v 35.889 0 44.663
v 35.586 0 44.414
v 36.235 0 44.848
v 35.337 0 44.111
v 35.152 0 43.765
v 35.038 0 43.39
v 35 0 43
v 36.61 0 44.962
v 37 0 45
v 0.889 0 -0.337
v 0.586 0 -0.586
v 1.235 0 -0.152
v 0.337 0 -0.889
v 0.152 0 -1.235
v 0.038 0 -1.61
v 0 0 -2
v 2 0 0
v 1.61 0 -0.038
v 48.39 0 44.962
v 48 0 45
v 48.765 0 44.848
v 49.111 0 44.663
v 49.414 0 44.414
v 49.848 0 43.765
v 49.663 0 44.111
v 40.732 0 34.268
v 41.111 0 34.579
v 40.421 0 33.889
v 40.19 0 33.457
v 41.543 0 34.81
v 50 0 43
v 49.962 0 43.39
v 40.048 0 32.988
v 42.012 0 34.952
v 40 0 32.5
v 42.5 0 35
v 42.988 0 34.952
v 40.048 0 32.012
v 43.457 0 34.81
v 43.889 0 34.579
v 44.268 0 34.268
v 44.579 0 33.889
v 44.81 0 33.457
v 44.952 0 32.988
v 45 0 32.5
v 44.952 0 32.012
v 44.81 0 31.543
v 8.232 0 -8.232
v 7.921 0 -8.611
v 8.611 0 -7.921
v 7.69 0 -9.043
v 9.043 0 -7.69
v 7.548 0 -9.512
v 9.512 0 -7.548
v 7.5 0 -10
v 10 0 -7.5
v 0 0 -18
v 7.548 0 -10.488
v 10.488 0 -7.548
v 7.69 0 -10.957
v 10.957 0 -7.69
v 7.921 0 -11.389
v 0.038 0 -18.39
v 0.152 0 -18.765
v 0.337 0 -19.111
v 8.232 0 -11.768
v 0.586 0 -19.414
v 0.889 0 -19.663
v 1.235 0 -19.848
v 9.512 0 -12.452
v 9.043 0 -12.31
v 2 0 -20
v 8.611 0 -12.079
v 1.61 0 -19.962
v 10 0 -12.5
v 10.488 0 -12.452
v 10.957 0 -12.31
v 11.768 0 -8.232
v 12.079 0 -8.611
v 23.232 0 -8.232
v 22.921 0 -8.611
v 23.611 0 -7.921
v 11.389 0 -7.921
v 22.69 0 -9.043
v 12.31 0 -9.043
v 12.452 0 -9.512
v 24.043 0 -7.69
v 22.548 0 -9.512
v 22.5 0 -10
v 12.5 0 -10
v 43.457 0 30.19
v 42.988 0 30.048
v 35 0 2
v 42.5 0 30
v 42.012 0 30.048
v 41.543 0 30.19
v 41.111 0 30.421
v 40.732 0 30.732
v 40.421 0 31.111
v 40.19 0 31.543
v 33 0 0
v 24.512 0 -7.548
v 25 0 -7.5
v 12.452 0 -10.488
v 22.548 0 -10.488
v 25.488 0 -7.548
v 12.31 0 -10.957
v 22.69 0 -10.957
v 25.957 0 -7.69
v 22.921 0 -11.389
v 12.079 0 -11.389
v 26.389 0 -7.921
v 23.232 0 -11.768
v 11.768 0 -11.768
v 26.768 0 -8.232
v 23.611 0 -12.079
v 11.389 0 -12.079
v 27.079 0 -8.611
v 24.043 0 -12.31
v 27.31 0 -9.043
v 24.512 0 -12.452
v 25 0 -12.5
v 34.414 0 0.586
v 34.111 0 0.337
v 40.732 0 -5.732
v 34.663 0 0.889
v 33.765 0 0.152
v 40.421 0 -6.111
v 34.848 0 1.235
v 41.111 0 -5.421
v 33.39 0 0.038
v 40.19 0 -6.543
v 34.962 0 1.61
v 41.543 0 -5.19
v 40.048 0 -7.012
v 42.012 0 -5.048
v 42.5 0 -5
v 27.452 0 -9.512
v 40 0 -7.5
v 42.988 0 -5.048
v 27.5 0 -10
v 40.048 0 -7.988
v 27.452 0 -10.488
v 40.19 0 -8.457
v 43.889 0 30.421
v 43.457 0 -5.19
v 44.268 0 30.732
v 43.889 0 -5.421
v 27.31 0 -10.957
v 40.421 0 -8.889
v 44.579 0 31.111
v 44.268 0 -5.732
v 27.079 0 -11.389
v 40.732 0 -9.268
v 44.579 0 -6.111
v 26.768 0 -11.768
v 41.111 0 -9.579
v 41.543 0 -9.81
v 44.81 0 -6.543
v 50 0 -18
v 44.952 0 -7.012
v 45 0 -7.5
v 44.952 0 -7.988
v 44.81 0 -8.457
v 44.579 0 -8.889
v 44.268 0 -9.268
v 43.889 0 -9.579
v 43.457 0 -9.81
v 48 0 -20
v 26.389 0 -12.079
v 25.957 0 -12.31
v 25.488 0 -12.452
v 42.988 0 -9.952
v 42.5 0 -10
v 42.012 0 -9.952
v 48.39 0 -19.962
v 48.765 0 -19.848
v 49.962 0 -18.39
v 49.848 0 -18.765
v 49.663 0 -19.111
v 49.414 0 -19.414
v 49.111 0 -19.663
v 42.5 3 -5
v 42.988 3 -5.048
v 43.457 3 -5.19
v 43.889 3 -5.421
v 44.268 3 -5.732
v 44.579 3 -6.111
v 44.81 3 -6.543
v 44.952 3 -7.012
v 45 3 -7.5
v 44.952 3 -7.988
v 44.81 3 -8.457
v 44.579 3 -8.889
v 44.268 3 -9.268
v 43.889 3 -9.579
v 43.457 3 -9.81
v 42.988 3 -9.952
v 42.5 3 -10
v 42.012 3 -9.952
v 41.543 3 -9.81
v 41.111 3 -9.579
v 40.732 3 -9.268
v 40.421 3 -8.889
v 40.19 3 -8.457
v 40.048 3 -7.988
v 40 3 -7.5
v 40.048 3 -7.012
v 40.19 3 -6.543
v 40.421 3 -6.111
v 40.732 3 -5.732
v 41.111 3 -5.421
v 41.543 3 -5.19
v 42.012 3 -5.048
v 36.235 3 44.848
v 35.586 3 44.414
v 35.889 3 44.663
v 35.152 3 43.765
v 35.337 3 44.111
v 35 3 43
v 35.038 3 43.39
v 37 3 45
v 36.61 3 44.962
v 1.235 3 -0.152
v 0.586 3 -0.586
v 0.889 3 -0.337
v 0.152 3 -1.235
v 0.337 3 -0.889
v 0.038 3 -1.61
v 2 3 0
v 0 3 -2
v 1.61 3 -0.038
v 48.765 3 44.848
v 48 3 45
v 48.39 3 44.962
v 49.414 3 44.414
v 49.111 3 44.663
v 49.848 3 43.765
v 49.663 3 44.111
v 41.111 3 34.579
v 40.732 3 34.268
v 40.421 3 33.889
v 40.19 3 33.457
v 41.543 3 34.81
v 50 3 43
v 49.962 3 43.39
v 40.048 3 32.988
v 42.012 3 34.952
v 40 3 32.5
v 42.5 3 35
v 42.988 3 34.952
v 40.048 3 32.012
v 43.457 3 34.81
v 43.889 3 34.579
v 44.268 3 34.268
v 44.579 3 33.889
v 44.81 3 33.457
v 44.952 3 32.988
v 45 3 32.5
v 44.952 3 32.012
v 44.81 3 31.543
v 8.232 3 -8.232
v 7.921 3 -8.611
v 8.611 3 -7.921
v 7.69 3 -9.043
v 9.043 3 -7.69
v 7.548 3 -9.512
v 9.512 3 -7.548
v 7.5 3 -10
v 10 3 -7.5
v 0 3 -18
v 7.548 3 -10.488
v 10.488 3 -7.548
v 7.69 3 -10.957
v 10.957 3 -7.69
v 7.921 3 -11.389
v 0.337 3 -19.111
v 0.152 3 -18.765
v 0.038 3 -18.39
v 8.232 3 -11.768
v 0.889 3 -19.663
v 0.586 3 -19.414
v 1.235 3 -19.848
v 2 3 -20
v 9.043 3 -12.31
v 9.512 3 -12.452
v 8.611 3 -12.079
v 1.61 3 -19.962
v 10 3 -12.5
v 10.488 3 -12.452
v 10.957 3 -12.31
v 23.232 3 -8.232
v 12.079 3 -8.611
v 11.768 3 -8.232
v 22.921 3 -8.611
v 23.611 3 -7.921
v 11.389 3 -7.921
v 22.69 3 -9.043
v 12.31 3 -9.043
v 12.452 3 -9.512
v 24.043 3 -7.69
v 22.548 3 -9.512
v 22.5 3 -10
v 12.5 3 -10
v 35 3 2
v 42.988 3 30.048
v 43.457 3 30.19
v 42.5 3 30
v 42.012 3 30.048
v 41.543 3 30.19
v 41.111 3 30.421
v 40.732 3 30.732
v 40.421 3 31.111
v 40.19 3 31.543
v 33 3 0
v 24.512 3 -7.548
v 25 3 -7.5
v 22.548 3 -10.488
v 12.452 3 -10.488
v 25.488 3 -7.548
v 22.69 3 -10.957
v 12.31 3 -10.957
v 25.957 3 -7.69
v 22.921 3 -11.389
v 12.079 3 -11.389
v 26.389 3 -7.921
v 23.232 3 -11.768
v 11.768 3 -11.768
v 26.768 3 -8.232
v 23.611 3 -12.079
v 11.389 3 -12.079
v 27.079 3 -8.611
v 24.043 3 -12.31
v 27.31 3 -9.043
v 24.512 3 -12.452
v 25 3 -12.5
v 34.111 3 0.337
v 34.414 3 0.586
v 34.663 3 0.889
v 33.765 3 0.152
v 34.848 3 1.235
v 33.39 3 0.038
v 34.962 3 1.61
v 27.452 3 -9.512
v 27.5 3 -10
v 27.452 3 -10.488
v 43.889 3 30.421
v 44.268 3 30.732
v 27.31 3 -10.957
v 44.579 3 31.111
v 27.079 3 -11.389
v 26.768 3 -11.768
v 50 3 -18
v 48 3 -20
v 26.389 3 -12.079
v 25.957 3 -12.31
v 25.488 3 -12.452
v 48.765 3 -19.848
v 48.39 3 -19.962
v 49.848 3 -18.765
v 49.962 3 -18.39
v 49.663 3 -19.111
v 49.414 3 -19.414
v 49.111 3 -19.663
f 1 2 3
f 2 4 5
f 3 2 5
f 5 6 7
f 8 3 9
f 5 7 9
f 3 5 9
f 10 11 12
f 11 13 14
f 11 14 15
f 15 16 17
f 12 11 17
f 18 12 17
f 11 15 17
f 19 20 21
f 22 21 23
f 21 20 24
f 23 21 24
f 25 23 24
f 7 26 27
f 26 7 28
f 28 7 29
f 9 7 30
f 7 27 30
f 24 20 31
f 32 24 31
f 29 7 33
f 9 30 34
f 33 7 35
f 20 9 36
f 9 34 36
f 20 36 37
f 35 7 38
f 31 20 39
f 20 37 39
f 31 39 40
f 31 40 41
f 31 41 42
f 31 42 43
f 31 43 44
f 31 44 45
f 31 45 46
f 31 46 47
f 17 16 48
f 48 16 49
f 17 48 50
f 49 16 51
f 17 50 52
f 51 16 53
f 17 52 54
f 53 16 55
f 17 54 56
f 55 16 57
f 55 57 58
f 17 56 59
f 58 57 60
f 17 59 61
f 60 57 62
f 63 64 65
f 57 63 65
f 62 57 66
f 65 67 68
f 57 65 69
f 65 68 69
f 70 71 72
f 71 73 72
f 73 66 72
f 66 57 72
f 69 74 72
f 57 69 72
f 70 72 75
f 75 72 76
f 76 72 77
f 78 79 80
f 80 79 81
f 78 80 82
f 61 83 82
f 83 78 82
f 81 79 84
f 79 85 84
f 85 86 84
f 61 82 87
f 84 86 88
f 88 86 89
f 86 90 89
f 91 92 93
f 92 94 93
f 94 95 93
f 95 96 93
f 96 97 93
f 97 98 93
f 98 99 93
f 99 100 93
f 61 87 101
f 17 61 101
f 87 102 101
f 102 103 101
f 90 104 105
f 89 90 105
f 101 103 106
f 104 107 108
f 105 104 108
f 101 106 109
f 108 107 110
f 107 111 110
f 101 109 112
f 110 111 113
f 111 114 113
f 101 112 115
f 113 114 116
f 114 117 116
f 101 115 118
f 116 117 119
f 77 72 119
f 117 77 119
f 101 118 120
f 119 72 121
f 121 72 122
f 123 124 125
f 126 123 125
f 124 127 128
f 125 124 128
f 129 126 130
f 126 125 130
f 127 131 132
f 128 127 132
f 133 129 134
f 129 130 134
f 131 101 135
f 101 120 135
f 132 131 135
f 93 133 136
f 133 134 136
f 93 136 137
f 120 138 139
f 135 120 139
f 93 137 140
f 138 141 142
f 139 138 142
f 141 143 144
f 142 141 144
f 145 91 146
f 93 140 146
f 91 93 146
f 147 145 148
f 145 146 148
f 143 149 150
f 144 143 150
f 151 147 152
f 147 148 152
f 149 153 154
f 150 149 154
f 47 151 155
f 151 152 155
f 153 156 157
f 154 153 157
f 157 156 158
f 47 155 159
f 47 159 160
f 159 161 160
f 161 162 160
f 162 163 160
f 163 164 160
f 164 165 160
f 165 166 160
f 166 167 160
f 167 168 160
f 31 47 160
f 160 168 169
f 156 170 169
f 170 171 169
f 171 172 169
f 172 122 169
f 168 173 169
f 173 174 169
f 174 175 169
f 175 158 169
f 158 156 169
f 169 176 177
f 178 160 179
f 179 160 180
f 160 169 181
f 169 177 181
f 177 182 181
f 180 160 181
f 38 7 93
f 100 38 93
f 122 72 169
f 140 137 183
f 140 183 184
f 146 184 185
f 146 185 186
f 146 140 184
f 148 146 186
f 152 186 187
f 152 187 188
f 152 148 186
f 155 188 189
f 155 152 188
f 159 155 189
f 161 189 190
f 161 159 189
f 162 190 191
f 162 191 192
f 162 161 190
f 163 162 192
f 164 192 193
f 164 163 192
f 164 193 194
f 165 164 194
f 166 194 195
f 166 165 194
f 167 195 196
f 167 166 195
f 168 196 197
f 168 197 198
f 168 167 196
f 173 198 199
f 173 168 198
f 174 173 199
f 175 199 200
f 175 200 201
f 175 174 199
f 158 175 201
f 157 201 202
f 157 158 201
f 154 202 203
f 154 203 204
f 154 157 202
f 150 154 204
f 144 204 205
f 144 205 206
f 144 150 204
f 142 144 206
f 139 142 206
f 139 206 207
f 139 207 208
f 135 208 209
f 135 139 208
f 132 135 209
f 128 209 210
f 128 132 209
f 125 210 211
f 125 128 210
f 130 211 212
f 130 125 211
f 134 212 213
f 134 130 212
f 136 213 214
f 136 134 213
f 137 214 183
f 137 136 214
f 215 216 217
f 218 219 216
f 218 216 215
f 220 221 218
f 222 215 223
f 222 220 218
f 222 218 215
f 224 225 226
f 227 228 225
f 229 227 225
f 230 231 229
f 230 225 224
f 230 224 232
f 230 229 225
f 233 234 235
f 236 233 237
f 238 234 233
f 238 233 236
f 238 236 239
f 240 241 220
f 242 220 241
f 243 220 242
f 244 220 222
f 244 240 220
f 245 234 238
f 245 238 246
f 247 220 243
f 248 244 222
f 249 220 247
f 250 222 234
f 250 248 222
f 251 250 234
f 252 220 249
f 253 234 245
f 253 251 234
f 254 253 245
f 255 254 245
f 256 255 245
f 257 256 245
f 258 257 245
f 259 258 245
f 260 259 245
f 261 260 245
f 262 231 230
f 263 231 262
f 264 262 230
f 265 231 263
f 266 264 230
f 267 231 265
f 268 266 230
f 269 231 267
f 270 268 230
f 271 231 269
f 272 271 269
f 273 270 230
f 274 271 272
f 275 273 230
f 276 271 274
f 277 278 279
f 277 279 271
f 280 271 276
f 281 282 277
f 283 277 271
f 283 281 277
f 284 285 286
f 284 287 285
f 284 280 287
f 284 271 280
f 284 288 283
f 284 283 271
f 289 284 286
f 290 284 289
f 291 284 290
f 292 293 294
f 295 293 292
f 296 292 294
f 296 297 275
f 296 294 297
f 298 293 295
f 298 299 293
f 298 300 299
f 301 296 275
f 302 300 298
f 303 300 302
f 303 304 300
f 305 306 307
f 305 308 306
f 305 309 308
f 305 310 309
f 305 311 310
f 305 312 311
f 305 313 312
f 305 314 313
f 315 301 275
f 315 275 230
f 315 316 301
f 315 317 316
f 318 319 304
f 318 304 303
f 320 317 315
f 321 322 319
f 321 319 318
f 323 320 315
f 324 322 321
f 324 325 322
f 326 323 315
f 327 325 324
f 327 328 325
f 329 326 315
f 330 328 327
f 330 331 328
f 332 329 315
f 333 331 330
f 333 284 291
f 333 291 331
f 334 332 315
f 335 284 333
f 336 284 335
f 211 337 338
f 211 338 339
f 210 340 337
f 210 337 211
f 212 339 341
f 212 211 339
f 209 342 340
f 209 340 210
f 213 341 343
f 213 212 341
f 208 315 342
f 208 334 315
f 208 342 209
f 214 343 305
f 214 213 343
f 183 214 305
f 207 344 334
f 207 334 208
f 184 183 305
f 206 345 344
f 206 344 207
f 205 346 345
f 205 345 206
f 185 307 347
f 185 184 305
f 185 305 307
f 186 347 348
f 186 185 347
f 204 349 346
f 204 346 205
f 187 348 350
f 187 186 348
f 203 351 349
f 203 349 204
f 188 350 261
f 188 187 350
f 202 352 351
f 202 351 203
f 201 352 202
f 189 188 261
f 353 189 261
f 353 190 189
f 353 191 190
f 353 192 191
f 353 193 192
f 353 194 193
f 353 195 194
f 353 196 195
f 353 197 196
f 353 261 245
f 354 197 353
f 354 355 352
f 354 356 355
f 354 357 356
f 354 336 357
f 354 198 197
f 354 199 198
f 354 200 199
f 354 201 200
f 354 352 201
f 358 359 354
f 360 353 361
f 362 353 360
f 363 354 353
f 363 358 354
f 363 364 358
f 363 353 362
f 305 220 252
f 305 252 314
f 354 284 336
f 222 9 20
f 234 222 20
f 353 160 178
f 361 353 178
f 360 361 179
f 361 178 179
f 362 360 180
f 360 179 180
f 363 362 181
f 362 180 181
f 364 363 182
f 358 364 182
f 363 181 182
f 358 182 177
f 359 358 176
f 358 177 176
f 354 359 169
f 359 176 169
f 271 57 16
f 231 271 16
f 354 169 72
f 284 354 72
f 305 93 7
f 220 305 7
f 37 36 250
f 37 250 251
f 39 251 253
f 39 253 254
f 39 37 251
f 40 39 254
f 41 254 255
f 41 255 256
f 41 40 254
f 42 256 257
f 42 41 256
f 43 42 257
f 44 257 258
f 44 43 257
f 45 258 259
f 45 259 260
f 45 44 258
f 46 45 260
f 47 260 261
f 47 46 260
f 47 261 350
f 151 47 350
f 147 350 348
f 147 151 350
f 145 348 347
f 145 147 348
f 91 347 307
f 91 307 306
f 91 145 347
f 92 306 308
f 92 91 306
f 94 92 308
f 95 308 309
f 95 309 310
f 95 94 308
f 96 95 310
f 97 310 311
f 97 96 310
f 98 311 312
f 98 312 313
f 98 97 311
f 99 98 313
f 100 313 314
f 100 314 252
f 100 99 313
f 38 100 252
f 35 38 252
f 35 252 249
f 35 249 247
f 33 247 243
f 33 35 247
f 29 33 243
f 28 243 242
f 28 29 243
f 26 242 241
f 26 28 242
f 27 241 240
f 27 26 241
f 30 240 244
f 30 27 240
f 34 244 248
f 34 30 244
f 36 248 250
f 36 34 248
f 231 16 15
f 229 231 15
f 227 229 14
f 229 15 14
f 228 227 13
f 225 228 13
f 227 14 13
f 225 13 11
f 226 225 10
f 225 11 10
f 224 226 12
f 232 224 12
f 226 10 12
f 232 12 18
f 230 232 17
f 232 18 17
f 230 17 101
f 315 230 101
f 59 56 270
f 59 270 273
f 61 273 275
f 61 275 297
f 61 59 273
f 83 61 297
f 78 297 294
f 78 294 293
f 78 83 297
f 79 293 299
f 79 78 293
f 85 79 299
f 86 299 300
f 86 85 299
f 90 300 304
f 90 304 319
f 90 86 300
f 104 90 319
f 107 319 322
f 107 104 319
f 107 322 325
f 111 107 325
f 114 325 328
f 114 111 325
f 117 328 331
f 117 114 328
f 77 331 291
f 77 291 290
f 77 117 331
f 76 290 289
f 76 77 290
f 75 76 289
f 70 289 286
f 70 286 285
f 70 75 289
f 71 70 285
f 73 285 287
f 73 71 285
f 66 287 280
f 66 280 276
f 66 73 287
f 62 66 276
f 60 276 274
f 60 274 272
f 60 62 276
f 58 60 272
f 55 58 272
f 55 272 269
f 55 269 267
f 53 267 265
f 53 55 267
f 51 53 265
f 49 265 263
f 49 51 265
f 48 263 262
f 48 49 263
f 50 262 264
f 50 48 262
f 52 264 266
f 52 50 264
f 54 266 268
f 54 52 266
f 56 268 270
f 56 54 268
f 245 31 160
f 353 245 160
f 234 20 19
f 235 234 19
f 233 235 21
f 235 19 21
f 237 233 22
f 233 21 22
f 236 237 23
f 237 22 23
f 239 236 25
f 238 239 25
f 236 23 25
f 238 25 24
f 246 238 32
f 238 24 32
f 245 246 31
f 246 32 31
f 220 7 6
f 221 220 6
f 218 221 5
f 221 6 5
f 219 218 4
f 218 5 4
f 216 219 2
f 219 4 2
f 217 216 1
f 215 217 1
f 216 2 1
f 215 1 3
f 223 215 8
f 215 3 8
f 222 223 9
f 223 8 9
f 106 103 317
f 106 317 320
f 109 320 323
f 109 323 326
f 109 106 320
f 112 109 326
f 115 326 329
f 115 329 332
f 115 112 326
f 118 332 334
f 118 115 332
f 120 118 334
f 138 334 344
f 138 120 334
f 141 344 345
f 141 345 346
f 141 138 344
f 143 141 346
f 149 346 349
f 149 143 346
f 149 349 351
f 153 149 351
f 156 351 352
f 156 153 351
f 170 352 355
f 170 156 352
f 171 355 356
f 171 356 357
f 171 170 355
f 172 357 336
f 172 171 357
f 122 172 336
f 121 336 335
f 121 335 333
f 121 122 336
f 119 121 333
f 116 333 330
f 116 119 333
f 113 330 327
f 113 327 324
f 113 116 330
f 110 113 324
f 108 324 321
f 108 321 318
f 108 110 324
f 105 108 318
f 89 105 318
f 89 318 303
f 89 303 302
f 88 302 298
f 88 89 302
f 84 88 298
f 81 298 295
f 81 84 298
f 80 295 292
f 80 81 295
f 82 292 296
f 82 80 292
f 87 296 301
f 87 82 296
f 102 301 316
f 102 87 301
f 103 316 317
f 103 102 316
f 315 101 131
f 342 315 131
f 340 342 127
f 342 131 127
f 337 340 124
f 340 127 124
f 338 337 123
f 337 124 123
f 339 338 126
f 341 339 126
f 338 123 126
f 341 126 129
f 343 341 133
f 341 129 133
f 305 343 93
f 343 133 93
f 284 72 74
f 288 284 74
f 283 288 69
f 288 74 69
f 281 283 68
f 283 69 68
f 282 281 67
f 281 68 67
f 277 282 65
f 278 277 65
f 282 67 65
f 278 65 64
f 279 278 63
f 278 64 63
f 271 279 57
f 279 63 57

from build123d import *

# Parameters (mm, degrees)
SKETCH_1_R      = 2.5
EXTRUDE_1_DEPTH = 3


with BuildPart() as part:
    # 草图1 → 凸台-拉伸1 (new body)
    with BuildSketch(Plane(origin=(0, 0, 0), x_dir=(1, 0, 0), z_dir=(0, 1, 0))):
        with BuildLine():
            ThreePointArc((0, 2), (0.585786438, 0.585786438), (2, 0))
            Line((2, 0), (33, 0))
            ThreePointArc((33, 0), (34.414213562, -0.585786438), (35, -2))
            Line((35, -2), (35, -43))
            ThreePointArc((35, -43), (35.585786438, -44.414213562), (37, -45))
            Line((37, -45), (48, -45))
            ThreePointArc((48, -45), (49.414213562, -44.414213562), (50, -43))
            Line((50, -43), (50, 0))
            Line((50, 0), (50, 18))
            ThreePointArc((50, 18), (49.414213562, 19.414213562), (48, 20))
            Line((48, 20), (2, 20))
            ThreePointArc((2, 20), (0.585786438, 19.414213562), (0, 18))
            Line((0, 18), (0, 2))
        make_face()
        with Locations(Location((42.5, -32.5, 0), (0, 0, 270))):
            Circle(SKETCH_1_R, mode=Mode.SUBTRACT)
        with Locations(Location((10, 10, 0), (0, 0, 270))):
            Circle(SKETCH_1_R, mode=Mode.SUBTRACT)
        with Locations(Location((25, 10, 0), (0, 0, 270))):
            Circle(SKETCH_1_R, mode=Mode.SUBTRACT)
        with Locations(Location((42.5, 7.5, 0), (0, 0, 270))):
            Circle(SKETCH_1_R, mode=Mode.SUBTRACT)
    extrude(amount=EXTRUDE_1_DEPTH)


solid = part.part
